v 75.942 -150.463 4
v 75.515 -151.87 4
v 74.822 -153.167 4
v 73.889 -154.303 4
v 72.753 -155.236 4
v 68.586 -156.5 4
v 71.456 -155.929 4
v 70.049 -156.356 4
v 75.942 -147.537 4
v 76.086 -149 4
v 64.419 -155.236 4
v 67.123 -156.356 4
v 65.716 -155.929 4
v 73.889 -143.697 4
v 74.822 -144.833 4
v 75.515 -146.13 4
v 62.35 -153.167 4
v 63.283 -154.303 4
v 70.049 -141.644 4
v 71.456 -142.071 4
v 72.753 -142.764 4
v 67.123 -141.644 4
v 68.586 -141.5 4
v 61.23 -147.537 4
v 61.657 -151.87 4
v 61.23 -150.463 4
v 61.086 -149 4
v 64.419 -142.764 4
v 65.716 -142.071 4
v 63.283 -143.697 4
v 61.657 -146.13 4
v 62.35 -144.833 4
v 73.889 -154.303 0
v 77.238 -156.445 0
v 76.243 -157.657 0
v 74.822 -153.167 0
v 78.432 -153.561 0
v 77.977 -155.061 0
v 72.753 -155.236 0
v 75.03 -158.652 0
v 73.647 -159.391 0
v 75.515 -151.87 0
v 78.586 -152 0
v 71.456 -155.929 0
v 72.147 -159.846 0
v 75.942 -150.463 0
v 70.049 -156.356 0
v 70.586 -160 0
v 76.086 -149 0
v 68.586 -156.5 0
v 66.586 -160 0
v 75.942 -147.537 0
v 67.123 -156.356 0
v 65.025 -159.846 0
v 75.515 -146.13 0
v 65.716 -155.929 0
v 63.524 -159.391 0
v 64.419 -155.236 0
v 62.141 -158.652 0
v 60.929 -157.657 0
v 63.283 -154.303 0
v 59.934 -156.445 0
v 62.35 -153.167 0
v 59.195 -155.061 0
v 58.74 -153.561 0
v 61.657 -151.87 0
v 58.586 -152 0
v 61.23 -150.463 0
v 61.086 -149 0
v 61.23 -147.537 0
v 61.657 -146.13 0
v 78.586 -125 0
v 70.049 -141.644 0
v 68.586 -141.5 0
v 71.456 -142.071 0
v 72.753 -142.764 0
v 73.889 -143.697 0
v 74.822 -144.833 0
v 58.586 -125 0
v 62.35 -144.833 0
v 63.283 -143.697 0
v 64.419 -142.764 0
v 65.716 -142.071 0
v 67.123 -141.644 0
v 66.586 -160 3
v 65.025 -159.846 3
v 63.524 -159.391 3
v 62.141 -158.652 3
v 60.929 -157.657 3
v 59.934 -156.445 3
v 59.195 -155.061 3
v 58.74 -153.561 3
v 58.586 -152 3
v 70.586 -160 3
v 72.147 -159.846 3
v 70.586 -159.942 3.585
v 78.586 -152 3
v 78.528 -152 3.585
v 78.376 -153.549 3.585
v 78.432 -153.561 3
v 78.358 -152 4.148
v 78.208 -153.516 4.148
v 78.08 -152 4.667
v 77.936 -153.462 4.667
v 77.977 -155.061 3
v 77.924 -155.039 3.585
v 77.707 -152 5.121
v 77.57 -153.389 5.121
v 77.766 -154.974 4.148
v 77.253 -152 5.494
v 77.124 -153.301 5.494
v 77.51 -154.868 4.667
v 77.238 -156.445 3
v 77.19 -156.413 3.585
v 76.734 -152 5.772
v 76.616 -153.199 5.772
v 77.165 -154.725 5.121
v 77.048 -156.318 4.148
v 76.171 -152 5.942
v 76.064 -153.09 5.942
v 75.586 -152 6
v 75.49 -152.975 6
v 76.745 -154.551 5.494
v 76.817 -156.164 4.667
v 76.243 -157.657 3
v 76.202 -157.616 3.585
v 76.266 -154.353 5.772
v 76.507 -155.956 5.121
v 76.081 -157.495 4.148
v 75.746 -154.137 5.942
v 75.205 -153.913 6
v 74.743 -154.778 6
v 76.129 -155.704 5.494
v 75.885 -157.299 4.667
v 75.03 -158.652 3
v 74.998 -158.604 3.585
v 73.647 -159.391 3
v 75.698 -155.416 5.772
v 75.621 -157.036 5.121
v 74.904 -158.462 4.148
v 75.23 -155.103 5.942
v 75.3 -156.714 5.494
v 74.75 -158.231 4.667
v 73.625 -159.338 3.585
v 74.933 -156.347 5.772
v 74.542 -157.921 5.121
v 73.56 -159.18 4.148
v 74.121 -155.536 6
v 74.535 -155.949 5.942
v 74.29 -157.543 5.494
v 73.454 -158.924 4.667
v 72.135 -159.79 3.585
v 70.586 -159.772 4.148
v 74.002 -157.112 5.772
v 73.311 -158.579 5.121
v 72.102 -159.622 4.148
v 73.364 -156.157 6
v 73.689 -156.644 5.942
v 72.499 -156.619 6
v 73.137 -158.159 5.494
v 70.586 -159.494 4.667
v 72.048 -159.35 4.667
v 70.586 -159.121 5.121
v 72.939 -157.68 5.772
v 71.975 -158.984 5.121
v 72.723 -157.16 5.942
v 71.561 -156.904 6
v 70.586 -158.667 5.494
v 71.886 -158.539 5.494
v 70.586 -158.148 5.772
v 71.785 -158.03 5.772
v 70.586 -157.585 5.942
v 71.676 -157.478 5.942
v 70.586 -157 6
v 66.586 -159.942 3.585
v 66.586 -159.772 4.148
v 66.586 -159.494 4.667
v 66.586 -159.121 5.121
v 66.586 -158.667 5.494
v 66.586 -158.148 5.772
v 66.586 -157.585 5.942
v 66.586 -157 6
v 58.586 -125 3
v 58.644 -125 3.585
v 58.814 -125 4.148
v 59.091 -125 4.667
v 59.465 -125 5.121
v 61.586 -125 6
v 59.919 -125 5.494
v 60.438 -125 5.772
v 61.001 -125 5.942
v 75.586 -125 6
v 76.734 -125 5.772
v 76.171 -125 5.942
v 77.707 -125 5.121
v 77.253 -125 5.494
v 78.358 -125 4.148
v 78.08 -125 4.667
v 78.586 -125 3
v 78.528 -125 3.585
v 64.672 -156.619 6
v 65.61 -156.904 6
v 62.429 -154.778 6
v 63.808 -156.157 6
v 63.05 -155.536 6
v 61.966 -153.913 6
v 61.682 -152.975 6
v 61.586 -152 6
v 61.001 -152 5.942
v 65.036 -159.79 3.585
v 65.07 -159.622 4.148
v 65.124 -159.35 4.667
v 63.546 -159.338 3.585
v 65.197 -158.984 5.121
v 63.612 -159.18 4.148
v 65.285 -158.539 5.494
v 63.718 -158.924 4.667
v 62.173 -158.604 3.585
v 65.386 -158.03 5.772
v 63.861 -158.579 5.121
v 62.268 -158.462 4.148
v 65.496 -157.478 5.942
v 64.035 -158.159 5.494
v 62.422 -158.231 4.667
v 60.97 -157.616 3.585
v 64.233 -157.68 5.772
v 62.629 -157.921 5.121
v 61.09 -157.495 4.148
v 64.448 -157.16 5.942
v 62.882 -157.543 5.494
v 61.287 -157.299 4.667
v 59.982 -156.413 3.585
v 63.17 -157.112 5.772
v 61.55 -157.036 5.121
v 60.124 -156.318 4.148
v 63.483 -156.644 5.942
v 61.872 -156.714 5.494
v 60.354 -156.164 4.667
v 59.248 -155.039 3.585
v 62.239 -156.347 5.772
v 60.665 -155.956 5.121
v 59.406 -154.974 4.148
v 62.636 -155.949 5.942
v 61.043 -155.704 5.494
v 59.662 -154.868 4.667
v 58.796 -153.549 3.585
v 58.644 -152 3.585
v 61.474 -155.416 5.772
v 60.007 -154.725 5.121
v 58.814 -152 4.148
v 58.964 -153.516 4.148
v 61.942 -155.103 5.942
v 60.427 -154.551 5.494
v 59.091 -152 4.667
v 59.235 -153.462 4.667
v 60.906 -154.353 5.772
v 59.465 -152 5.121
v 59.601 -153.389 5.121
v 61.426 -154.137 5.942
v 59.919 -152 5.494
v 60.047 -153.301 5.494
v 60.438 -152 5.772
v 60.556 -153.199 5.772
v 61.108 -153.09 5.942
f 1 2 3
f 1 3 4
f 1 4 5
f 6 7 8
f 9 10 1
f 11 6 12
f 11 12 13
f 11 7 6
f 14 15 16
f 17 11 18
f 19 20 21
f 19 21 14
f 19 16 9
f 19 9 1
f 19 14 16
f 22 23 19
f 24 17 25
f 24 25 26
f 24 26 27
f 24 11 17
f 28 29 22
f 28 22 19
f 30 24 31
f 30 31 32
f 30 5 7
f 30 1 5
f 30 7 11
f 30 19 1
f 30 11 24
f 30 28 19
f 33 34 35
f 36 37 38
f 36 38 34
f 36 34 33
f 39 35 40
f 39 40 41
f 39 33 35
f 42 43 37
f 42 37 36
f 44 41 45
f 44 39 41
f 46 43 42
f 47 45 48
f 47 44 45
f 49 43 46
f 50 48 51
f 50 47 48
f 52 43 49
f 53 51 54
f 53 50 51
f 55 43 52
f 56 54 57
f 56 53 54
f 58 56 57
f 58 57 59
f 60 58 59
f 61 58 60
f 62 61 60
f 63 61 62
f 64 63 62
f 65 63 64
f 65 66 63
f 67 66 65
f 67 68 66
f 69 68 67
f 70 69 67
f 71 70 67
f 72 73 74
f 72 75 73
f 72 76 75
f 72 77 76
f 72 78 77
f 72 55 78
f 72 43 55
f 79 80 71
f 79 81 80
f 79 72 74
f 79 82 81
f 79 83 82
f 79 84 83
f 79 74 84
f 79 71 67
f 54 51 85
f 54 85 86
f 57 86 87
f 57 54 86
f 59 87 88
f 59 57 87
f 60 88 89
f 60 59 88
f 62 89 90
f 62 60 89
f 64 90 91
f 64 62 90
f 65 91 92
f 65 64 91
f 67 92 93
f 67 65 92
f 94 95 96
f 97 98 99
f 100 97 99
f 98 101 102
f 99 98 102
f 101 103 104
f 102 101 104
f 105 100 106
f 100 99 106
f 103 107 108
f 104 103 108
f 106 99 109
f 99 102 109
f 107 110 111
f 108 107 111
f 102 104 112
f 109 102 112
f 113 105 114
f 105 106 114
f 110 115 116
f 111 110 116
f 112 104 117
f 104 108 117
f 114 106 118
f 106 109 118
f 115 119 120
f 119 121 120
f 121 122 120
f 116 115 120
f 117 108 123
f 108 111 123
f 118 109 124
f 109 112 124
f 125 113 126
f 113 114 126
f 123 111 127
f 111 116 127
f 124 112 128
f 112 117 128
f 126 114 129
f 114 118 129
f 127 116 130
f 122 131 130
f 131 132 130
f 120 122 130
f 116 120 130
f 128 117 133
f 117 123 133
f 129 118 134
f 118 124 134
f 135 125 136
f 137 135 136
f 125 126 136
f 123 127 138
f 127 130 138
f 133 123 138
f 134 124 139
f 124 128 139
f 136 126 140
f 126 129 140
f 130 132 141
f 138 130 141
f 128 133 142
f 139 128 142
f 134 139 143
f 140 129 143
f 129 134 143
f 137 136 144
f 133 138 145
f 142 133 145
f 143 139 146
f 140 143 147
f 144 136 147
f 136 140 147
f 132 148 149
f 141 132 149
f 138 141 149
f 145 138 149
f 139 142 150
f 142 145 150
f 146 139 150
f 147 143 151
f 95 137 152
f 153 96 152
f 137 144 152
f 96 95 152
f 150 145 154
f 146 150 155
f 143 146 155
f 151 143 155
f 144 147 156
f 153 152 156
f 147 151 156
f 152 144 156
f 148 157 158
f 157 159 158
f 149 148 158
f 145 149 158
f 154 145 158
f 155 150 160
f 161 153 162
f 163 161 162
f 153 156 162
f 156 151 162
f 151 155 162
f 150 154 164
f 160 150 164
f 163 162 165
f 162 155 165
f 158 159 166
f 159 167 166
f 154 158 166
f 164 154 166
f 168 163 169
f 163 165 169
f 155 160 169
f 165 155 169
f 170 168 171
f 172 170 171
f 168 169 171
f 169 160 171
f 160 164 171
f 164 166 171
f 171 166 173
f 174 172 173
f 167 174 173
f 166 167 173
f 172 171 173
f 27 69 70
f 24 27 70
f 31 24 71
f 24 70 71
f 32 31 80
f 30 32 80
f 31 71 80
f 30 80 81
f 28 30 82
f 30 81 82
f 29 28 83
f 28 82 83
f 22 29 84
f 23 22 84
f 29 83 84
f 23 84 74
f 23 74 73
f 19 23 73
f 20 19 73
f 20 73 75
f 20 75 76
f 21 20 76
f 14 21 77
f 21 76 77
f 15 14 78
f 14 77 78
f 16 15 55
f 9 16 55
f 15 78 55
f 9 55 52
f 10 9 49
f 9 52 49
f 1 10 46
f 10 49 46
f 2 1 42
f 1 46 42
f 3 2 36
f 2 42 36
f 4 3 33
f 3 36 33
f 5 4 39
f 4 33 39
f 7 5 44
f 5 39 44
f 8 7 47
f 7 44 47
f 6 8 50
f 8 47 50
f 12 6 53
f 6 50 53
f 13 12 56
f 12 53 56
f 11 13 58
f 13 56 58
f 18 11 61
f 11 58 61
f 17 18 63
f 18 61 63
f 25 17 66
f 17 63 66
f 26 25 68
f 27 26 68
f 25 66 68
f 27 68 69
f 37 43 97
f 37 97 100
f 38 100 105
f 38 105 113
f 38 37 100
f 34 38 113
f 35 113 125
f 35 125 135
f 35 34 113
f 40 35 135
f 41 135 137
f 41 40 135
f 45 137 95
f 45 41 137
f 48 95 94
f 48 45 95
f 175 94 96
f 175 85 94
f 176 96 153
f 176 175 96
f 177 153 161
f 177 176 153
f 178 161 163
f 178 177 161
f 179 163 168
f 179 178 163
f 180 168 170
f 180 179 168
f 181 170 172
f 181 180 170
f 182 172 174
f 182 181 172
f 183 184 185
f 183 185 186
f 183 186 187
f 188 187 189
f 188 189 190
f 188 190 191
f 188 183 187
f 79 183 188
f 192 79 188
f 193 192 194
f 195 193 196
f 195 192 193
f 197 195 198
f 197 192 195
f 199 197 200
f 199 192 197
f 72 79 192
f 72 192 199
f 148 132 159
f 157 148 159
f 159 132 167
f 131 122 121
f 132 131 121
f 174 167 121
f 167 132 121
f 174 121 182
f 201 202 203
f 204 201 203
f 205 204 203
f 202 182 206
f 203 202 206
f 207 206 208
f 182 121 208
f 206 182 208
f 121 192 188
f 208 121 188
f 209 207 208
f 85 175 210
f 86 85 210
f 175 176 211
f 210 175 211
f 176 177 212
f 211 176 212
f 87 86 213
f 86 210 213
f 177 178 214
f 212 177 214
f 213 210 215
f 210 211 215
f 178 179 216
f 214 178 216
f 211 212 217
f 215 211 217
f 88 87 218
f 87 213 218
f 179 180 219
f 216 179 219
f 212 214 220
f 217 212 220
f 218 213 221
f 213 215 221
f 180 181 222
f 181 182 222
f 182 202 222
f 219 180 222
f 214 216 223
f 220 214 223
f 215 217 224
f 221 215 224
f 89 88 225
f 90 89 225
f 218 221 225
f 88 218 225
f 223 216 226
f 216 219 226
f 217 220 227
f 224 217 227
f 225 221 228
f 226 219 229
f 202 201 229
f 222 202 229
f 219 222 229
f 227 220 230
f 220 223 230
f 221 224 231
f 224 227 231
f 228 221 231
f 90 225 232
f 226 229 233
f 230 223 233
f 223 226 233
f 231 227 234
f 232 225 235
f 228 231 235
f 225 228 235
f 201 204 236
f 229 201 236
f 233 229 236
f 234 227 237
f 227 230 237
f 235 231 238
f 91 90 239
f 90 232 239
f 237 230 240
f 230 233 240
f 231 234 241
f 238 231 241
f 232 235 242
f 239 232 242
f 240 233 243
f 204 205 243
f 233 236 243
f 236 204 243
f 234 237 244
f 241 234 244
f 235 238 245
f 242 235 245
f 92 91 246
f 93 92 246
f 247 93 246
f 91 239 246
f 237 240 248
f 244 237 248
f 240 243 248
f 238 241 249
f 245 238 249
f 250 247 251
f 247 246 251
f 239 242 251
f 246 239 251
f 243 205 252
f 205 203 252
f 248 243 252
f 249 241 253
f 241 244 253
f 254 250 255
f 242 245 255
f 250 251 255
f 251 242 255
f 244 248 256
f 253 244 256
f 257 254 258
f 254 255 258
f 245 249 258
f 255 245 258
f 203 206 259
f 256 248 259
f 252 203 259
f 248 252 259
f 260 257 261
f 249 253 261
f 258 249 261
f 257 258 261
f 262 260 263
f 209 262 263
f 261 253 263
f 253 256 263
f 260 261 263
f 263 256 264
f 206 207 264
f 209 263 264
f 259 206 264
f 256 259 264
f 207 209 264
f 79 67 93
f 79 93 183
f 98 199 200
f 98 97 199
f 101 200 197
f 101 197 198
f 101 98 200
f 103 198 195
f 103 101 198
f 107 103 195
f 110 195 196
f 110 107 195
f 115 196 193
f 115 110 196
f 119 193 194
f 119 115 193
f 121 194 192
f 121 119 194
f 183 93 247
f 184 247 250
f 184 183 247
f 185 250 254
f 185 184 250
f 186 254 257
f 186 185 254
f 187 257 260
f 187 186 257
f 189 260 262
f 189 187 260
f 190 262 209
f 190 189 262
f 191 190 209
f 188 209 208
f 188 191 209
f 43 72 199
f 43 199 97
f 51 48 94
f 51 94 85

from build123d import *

# Parameters (mm, degrees)
BOSS_EXTRUDE1_DEPTH = 6
FILLET1_R           = 3
SKETCH2_R           = 7.5
CUT_EXTRUDE1_DEPTH  = 4


with BuildPart() as part:
    # Sketch1 → Boss-Extrude1 (new body)
    with BuildSketch(Plane.XY):
        with BuildLine():
            Line((58.585871194, -125), (78.585871194, -125))
            Line((78.585871194, -125), (78.585871194, -152))
            ThreePointArc((78.585871194, -152), (76.242725443, -157.656854249), (70.585871194, -160))
            Line((70.585871194, -160), (66.585871194, -160))
            ThreePointArc((66.585871194, -160), (60.929016944, -157.656854249), (58.585871194, -152))
            Line((58.585871194, -152), (58.585871194, -125))
        make_face()
    extrude(amount=BOSS_EXTRUDE1_DEPTH)

    # Fillet1
    fillet1_edges = [part.edges().sort_by_distance(p)[0] for p in [
        (68.585871194, -160, 6),
        (76.242725443, -157.656854249, 6),
        (78.585871194, -138.5, 6),
        (58.585871194, -138.5, 6),
        (60.929016944, -157.656854249, 6),
    ]]
    fillet(fillet1_edges, radius=FILLET1_R)

    # Sketch2 → Cut-Extrude1 (cut)
    with BuildSketch(Plane(origin=(0, 0, 0), x_dir=(-1, 0, 0), z_dir=(0, 0, -1))):
        with Locations((-68.585871194, -149)):
            Circle(SKETCH2_R)
    extrude(amount=-CUT_EXTRUDE1_DEPTH, mode=Mode.SUBTRACT)


solid = part.part
